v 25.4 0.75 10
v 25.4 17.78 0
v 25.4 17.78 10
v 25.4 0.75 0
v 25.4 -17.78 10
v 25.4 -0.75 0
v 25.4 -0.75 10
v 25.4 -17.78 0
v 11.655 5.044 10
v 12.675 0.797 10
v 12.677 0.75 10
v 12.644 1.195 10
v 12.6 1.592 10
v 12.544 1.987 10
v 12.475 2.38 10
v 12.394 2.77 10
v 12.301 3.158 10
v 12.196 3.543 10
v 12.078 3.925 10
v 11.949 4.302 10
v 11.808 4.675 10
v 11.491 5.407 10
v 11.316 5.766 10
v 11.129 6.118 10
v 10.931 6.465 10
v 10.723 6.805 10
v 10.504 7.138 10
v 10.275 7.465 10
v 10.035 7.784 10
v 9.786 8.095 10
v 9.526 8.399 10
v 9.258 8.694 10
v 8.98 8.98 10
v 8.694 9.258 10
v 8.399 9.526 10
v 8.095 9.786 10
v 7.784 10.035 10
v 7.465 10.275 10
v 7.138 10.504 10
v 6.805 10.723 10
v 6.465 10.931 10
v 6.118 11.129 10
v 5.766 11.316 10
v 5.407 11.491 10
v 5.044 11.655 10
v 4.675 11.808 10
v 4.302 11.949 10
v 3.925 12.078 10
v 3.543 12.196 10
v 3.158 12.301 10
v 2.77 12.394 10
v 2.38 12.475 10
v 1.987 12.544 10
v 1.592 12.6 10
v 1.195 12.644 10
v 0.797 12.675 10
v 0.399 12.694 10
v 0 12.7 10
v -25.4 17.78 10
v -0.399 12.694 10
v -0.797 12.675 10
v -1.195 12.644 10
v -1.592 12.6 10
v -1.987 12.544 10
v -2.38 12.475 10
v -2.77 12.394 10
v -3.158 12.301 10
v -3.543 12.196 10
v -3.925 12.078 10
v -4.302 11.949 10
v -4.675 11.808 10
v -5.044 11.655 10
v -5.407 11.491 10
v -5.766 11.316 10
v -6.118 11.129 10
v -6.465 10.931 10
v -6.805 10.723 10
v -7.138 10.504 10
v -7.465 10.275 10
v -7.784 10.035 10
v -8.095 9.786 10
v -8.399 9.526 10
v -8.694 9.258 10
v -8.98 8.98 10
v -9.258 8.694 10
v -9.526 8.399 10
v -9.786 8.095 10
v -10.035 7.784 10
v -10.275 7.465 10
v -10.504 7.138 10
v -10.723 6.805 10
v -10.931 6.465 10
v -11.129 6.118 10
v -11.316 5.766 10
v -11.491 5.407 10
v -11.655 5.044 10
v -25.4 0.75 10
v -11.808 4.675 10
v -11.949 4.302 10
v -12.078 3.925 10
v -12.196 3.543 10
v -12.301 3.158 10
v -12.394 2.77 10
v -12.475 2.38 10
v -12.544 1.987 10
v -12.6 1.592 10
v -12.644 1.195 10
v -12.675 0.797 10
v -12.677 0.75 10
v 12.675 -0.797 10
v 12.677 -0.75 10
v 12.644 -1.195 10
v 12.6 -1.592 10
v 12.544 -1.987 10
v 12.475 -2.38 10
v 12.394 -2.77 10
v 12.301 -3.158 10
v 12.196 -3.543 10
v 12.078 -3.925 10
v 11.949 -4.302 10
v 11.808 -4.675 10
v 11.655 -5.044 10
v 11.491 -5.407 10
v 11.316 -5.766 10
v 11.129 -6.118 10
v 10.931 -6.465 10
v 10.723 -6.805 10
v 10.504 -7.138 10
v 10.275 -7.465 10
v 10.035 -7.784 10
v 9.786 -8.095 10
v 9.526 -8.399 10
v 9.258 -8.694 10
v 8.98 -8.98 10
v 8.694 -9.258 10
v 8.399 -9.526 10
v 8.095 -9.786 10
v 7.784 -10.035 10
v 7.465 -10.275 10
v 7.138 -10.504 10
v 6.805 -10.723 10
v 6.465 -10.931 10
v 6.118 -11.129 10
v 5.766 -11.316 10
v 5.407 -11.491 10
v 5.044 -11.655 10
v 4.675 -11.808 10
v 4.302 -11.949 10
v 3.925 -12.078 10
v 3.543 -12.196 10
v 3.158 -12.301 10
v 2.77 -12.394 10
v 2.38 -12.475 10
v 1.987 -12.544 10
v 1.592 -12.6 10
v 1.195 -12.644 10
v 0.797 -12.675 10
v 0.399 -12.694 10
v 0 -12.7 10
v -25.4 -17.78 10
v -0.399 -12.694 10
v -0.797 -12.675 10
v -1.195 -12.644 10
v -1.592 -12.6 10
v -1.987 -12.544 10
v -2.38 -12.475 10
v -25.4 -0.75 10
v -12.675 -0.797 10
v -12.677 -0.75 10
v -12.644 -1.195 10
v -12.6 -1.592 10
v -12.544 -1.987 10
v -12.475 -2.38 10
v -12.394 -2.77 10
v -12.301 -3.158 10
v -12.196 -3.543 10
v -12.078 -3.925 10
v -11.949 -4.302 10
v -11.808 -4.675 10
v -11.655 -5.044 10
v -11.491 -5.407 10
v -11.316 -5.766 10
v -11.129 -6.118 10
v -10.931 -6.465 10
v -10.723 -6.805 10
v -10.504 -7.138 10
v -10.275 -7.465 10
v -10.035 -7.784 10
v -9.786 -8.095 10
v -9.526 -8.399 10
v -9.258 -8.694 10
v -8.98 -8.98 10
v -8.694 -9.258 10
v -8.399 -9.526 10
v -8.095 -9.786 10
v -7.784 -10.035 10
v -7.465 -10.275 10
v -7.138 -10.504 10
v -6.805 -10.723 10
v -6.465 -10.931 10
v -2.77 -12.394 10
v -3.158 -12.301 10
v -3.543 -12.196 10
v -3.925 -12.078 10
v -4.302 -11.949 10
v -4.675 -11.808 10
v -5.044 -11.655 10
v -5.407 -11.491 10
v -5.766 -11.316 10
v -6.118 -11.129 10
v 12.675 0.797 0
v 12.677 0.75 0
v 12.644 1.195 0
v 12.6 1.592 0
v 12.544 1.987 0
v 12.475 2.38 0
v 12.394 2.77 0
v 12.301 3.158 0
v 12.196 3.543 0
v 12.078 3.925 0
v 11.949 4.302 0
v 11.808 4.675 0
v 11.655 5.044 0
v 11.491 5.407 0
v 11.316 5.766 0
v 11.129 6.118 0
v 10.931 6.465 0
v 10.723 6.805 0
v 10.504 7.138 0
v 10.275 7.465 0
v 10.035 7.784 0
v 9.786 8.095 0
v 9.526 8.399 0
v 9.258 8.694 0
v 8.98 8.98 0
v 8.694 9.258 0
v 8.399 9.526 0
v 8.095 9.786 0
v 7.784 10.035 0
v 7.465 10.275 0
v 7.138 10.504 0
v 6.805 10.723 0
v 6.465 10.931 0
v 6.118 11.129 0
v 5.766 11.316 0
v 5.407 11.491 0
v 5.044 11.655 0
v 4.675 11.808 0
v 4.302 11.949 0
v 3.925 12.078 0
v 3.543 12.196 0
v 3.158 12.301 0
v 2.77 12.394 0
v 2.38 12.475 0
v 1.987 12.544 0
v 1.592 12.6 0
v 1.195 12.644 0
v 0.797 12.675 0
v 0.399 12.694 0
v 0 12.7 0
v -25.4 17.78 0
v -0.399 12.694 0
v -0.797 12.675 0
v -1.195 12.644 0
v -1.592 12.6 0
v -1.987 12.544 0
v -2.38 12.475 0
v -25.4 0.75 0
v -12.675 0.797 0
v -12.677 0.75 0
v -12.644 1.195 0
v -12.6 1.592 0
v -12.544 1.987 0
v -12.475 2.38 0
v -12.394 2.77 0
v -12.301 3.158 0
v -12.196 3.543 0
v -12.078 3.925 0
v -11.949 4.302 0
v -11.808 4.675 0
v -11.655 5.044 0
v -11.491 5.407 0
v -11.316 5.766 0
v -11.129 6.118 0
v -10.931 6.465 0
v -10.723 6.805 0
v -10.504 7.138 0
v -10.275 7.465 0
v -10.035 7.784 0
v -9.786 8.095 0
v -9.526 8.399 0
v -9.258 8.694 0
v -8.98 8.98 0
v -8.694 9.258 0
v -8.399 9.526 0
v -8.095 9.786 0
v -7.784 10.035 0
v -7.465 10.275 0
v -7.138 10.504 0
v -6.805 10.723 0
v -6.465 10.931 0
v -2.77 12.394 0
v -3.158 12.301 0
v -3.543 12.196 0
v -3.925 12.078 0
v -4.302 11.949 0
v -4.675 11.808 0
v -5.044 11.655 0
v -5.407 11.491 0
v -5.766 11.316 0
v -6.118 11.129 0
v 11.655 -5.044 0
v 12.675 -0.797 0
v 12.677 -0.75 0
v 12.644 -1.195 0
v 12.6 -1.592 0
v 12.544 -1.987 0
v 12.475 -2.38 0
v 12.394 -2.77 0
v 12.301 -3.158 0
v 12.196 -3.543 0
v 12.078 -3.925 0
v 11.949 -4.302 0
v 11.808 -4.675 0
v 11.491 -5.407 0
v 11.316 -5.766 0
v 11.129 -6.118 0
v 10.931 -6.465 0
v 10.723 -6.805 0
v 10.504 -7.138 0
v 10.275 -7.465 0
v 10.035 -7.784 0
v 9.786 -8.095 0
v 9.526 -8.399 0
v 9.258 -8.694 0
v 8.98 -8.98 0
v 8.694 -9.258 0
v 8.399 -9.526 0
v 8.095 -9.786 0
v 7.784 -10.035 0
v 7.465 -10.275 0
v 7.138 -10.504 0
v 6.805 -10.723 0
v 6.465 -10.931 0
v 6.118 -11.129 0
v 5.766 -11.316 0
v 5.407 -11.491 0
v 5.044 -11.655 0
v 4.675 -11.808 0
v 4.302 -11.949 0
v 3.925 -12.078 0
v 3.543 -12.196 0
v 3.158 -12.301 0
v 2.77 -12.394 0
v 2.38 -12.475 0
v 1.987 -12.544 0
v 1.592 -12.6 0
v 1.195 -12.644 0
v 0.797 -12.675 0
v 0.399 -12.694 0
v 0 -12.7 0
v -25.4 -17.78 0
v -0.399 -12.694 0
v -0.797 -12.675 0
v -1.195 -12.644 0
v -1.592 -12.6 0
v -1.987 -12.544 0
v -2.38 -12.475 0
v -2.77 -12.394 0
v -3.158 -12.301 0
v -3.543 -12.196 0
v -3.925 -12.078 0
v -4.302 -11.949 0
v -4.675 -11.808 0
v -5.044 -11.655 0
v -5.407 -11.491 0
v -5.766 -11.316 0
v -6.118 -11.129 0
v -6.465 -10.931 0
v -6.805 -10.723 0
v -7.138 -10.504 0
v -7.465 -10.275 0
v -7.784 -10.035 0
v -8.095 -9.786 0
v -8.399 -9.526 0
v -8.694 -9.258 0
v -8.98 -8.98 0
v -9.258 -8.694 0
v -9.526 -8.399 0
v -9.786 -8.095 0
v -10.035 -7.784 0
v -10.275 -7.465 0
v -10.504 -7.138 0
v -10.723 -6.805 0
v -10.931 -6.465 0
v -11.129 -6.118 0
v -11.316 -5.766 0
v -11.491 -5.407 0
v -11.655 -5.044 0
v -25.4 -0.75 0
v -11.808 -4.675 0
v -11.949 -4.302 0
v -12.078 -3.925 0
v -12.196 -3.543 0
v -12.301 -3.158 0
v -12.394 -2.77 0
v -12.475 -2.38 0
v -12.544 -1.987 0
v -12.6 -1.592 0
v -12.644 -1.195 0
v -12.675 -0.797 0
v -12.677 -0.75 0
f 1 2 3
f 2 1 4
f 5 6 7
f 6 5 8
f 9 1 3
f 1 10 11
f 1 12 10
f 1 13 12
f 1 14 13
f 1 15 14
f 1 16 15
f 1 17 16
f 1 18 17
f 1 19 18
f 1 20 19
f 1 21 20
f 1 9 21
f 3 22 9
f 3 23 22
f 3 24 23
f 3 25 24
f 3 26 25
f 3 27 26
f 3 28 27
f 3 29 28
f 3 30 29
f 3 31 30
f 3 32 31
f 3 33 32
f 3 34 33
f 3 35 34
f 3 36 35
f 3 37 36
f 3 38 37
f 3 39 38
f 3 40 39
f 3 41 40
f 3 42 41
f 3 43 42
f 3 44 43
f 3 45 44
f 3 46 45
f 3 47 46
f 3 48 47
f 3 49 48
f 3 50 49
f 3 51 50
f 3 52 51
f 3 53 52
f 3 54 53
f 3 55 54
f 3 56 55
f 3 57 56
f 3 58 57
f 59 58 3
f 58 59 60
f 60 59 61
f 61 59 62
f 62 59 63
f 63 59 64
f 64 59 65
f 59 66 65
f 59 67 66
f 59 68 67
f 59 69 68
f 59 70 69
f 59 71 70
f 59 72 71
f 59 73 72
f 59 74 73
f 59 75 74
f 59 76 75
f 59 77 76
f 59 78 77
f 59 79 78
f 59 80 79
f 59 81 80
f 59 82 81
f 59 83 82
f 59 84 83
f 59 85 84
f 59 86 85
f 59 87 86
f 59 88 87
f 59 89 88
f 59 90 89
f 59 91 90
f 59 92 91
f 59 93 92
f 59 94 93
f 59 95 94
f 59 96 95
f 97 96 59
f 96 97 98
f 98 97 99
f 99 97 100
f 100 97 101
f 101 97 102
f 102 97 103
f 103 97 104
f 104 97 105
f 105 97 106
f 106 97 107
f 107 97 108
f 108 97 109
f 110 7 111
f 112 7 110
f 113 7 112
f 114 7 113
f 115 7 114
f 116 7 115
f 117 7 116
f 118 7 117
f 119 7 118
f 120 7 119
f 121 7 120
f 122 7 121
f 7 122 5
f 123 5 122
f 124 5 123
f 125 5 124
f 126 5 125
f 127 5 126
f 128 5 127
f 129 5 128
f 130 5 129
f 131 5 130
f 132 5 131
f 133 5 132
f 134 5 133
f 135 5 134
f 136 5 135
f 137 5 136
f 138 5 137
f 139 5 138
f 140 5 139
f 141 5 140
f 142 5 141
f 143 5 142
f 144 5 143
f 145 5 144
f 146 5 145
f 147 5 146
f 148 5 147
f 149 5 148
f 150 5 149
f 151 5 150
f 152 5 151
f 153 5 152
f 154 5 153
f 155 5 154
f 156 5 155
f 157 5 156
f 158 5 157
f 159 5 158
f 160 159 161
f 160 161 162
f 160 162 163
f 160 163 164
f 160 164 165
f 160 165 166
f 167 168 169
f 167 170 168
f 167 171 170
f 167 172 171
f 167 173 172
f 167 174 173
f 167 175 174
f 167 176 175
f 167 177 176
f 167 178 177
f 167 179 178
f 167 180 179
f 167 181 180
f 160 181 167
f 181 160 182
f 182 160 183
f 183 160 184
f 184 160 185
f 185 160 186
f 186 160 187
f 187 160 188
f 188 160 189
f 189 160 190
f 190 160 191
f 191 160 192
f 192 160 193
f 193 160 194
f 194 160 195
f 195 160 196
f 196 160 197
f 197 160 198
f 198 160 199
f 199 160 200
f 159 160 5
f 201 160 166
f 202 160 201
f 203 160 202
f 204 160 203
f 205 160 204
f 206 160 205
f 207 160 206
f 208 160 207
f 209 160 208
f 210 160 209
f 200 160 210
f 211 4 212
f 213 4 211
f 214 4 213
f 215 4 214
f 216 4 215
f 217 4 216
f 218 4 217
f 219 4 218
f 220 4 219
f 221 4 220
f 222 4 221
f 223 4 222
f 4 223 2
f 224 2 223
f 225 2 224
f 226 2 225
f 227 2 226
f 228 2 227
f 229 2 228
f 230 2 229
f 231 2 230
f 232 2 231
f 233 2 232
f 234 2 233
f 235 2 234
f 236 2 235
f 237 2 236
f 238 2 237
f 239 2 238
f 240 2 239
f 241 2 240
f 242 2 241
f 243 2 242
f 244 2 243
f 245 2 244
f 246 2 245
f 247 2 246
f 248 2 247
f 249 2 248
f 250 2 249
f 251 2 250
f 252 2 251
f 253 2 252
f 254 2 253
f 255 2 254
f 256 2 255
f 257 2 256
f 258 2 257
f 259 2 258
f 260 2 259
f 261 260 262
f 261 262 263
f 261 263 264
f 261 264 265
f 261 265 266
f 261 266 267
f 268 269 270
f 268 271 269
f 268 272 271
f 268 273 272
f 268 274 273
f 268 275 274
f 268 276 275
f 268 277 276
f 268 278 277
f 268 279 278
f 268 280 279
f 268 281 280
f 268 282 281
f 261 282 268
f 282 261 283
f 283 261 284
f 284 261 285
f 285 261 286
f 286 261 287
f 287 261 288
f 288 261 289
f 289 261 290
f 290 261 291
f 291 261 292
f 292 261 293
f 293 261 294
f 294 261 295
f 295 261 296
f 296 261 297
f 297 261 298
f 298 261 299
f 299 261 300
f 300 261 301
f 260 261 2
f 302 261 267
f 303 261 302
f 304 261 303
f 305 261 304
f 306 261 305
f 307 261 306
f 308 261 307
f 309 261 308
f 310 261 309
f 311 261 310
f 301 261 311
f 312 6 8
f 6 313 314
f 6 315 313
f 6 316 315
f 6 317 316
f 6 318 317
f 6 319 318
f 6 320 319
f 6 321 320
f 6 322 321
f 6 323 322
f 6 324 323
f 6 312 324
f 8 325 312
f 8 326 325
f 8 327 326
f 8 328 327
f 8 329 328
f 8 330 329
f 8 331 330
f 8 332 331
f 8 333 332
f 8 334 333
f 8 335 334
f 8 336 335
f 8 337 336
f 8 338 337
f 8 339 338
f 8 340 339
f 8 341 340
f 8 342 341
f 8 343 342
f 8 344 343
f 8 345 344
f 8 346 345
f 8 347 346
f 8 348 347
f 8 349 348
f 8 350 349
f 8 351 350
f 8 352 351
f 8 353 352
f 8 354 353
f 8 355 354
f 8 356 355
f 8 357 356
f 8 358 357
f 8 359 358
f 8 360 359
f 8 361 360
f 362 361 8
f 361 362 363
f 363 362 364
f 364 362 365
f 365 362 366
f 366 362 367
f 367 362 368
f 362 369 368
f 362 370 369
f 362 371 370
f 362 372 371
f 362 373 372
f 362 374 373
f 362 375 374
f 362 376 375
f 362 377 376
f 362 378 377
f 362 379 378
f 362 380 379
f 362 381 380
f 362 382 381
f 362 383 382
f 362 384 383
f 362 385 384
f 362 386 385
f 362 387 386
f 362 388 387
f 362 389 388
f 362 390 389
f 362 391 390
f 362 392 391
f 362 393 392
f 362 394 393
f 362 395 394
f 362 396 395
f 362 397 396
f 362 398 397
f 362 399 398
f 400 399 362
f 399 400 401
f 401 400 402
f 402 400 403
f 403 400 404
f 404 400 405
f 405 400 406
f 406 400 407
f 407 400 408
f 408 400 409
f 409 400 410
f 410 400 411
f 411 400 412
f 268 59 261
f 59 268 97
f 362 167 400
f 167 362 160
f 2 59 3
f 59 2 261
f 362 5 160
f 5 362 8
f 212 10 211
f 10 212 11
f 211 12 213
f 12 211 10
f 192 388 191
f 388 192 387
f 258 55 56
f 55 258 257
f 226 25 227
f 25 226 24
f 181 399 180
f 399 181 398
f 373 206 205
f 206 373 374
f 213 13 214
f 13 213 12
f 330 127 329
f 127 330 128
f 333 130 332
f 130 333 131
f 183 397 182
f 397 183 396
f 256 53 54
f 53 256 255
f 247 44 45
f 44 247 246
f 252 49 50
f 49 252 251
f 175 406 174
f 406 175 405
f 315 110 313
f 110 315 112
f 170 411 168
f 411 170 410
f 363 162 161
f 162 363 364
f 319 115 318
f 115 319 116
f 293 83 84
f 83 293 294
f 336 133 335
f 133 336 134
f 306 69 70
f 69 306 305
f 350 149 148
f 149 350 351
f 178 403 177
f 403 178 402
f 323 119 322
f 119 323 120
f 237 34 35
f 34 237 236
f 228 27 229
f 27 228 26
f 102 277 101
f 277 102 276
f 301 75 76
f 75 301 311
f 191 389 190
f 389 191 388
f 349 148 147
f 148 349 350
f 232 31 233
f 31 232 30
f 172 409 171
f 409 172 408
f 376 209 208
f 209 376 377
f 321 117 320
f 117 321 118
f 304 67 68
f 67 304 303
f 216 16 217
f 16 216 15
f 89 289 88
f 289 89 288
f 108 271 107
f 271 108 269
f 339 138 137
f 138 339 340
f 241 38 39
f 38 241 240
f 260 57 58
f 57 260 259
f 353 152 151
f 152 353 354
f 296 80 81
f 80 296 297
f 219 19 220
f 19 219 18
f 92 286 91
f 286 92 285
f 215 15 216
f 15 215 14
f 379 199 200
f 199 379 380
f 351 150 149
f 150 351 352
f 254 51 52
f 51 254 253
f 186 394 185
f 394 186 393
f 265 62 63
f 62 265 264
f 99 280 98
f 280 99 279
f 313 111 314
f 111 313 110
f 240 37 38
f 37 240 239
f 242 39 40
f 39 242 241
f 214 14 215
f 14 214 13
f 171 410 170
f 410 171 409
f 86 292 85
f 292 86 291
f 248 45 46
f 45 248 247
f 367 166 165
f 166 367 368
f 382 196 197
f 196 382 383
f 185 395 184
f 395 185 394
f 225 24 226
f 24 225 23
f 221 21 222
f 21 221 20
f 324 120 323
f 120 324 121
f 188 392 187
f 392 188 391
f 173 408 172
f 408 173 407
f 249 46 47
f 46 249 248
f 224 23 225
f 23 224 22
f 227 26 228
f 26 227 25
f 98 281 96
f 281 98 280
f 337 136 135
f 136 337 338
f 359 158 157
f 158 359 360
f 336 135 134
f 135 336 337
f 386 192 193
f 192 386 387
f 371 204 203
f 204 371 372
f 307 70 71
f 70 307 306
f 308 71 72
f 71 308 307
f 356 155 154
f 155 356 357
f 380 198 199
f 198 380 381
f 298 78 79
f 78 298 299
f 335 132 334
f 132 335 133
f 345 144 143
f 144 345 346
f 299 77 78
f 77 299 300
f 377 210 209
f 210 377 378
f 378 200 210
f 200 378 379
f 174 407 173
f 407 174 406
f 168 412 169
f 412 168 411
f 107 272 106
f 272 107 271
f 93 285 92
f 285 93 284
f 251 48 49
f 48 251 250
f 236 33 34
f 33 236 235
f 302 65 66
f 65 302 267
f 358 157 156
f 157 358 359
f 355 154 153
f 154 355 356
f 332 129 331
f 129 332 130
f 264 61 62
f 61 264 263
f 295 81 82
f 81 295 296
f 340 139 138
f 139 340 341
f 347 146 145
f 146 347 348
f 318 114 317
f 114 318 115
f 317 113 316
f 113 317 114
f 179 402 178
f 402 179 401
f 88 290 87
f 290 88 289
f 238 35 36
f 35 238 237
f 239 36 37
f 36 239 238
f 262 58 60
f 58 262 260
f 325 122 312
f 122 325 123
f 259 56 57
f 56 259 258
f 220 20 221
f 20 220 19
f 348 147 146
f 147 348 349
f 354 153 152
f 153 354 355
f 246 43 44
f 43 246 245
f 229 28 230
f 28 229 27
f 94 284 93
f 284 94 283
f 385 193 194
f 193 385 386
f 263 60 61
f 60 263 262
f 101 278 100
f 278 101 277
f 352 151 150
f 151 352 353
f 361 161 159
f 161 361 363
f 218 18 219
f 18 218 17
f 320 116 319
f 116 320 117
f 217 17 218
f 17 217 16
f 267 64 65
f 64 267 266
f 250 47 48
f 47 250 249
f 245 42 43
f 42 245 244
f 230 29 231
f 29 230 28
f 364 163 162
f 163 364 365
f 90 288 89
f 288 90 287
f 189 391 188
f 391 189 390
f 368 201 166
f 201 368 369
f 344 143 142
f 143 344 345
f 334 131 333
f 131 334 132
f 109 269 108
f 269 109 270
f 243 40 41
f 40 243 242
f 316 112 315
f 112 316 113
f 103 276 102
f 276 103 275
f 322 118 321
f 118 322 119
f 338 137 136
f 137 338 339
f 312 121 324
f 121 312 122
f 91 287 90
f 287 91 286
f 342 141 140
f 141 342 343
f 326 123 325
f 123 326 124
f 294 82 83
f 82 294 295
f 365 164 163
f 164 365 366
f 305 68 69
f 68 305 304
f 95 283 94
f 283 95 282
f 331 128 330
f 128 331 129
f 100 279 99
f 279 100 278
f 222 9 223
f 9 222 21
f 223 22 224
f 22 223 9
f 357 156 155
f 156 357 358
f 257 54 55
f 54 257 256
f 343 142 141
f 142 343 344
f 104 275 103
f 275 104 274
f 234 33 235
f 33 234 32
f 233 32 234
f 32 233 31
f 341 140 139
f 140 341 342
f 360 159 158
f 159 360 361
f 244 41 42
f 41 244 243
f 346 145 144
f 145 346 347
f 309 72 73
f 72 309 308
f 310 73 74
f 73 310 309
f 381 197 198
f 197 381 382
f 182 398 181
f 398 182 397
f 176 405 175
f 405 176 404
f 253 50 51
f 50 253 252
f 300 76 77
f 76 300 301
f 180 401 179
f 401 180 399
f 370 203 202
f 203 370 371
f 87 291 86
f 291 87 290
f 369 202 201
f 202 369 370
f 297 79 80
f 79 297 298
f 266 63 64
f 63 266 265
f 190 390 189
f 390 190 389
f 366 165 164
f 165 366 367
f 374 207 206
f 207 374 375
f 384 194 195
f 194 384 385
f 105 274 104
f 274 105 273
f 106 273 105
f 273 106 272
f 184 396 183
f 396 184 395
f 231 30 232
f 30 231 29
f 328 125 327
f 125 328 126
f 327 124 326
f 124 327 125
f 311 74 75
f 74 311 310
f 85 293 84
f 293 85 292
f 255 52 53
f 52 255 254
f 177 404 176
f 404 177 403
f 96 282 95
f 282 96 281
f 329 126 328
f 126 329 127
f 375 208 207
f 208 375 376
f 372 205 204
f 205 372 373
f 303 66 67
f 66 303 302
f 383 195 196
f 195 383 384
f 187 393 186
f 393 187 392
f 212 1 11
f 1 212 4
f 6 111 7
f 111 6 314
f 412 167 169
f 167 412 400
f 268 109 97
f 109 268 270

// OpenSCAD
// file: ../888_2001.scad
//improving rendering speed.
draft = true;   // sets rendering quality to draft.
$fs = draft ? 5 : 0.5;
$fa = 10;

module 888_2001(height = 10, height_of_cap_cylinder = 2){

    width = main_tube_outer_diameter*2; 
    depth = main_tube_outer_diameter + 4*thickness_between_tubes;
    
    difference (){

        translate([-(width/2),-(depth/2),0])
        color([0,0.9,0])
            cube ([width,depth,height]);
        
        //tube
        translate([0,0,- global_clearance])
           cylinder(h = 2*main_tube_outer_diameter + global_clearance,r = main_tube_outer_diameter/2, $fn = draft ? 100 : 200);

        /*//screw
        translate([0,depth/2 + global_clearance/2,7.5])
           rotate([90,0,0])
               cylinder(h = depth + global_clearance, r = M4_screw_diameter/2, $fn = draft ? 10 : 20);


        translate([0,depth/2 + global_clearance/2,42.5])
           rotate([90,0,0])
               cylinder(h = depth + global_clearance, r = M4_screw_diameter/2, $fn = draft ? 10 : 20);
        */
        //prořezy pro zajištění proti otočení
        translate([main_tube_outer_diameter/2 -global_clearance,- (3*global_clearance)/2,- main_tube_outer_diameter])
                cube([main_tube_outer_diameter, 3*global_clearance, 4*main_tube_outer_diameter]);

        mirror([1,0,0])
        translate([main_tube_outer_diameter/2 - global_clearance,- (3*global_clearance)/2,- main_tube_outer_diameter])
                cube([main_tube_outer_diameter, 3*global_clearance, 4*main_tube_outer_diameter]);

        //šrouby pro zajištění
        translate([depth/2,0,width/2])
            rotate([90,0,0])
                union(){
                        cylinder(h = 50, r = M4_screw_diameter/2, $fn = draft ? 10 : 20, center = true);
                translate([0,0, main_tube_outer_diameter/2 + 2*thickness_between_tubes - 2*Nut_height_M4])
                        cylinder(h = Nut_height_M4*2 + global_clearance, r = Nut_diameter_M4/2, $fn = 6);
                translate([0,0, - main_tube_outer_diameter/2 - 2*thickness_between_tubes - global_clearance])
                        cylinder(h = Nut_height_M4*2 + global_clearance, r = Nut_diameter_M4/2, $fn = 6);
                }
        
        mirror([1,0,0])
        translate([depth/2,0,width/2])
            rotate([90,0,0])
                union(){
                        cylinder(h = 50, r = M4_screw_diameter/2, $fn = draft ? 10 : 20, center = true);
                translate([0,0, main_tube_outer_diameter/2 + 2*thickness_between_tubes - 2*Nut_height_M4])
                        cylinder(h = Nut_height_M4*2 + global_clearance, r = Nut_diameter_M4/2, $fn = 6);
                translate([0,0, - main_tube_outer_diameter/2 - 2*thickness_between_tubes - global_clearance])
                        cylinder(h = Nut_height_M4*2 + global_clearance, r = Nut_diameter_M4/2, $fn = 6);
                }
    }



}


888_2001(draft);


include <../Parameters.scad>
// file: ../../Parameters.scad
//Main tube diameter - hole [mm]
main_tube_outer_diameter = 25.4;
main_tube_inner_diameter = 23.5;

//Tube for undercarriage - hole [mm]
tube_for_undercarriage_outer_diameter = 10.6;
tube_for_undercarriage_inner_diameter = 6;
global_clearance = 0.5;


//umístění podvozkových trubek

second_undercarriage_hole = main_tube_outer_diameter*2 + main_tube_outer_diameter/5 + main_tube_outer_diameter/2 + 170 + 160;

// Parameters of cube couplings
coupling_wall_thickness = main_tube_outer_diameter/5;  //width of coupling walls 
thickness_between_tubes = main_tube_outer_diameter/10;    // minimum distance between tubes in couplings

coupling_wall_thickness_undercarriage = tube_for_undercarriage_outer_diameter/3;
thickness_between_tubes_undercarriage = tube_for_undercarriage_outer_diameter/10;

//Screw diameter and nut for M4 [mm]
M4_screw_diameter=4.5;
Nut_height_M4 = 3.2;
Nut_diameter_M4 = 7.86;


//Screw diameter and nut for M3 [mm]
M3_screw_diameter = 3.2;
Nut_height_M3 = 1.7;	
Nut_diameter_M3 = 6.6; 


//The tube for help
Help_main_tube_outer = 25;
Help_main_tube_inner = 23; 
Help_tube_for_undercarriage_outer = 10;
Help_tube_for_undercarriage_inner = 5;


//main hull parameters

hull_drop_length = 580;
hull_wall_thickness = 0.8;
hull_y_size = 120;
hull_z_size = 150;
hull_x_size = 580;
hull_corner_radius = 4;
hull_airfoil_thickness= 35;  // thickness of drop generating airfoil in percent of lenght.
hull_scale_x = 1;
hull_scale_y = 1.5;
hull_scale_z = 1.5;

main_pilon_position = 170+68;
cover_pilon_position = 180;
height_of_vertical_tube = 275; //278mm je změřená délka trubky. 

ribbon_width = 5; // šířka vyztužovacích lemů. 

// šířka otvoru v přední části kapoty pro držák motoru.
width_of_engine_holder = 63;

//Top Cover Division - dělení horního krytu pro tisk
top_cover_division = [0, 50, 150, 280, 410, hull_x_size]; // upraveny seznam tak, aby deleni začinalo od nuly, což umožňí úplně automatické rozdělení.

//Bottom Cover Division - dělení dolního krytu pro tisk
bottom_cover_division = [0,100,250,365, 470, hull_x_size];
// zkrácená část pro payload pro testovací tisk
//bottom_cover_division = [0,200,250,365, 470, hull_x_size];

//Base Divison - dělení podložky
base_division = [0,140,280,410, hull_x_size];

//Cover pilon division - na výšku (v ose Z)
cover_pilon_division = [0,170,height_of_vertical_tube + main_tube_outer_diameter + coupling_wall_thickness];

//pozice šroubů
	//horní kryt
top_screw_position = [0, (top_cover_division[0] + top_cover_division[1])/4, (top_cover_division[2] - top_cover_division[1])/2 + top_cover_division[1], (top_cover_division[3] - top_cover_division[2])/2 + top_cover_division[2],(top_cover_division[4] - top_cover_division[3])/2 + top_cover_division[3],(top_cover_division[5] - top_cover_division[4])/2 + top_cover_division[4] - 20];
	//spodní kryt
bottom_screw_position = [0,(bottom_cover_division[0] + bottom_cover_division[1])/15 + 5, bottom_cover_division[1]/1.1, + bottom_cover_division[3], bottom_cover_division[3] + bottom_cover_division[1]/2, bottom_cover_division[4] - 6*global_clearance, bottom_cover_division[4] + bottom_cover_division[1]/2.5];




//šířka zámků
lock_width = 10;

//délka zámků
lock_length = 3;


//accumulator
//základní rozměry akumulátoru
width_of_accumulator = 129.4;//45+1;
depth_of_accumulator = 40.61;
height_of_accumulator = 43.65;
//Zapuštění akumulátoru
sink_of_accumulator = 5; //main_tube_outer_diameter/5 - Nut_height_M3*1.5;

//tloušťka hrany spojky
accumulator_holder_width = 18; 
accumulator_holder_thickness = 10; 

//posunutí akumálátoru na podložce
move_of_accumulator = 165;   // pozice akumulátoru (ovlivňuje těžiště)


////////////////
// Senzory
///////////////////

//opticalFlow
    width_optical_flow_senzor = 45.5;
    depth_optical_flow_senzor = 6;
    height_optical_flow_senzor = 35;
    sink_of_optical_flow_senzor = depth_optical_flow_senzor - 5; 
    M3_optical_flow_senzor_Z = 30.4;
    M3_optical_flow_senzor_X = 24;
    M3_optical_flow_senzor_Z_alone = 9.1;
    M3_optical_flow_senzor_X_alone = 16.7;
// main file
include <../../Parameters.scad>

use <../888_2001.scad>

        888_2001(draft=false);
